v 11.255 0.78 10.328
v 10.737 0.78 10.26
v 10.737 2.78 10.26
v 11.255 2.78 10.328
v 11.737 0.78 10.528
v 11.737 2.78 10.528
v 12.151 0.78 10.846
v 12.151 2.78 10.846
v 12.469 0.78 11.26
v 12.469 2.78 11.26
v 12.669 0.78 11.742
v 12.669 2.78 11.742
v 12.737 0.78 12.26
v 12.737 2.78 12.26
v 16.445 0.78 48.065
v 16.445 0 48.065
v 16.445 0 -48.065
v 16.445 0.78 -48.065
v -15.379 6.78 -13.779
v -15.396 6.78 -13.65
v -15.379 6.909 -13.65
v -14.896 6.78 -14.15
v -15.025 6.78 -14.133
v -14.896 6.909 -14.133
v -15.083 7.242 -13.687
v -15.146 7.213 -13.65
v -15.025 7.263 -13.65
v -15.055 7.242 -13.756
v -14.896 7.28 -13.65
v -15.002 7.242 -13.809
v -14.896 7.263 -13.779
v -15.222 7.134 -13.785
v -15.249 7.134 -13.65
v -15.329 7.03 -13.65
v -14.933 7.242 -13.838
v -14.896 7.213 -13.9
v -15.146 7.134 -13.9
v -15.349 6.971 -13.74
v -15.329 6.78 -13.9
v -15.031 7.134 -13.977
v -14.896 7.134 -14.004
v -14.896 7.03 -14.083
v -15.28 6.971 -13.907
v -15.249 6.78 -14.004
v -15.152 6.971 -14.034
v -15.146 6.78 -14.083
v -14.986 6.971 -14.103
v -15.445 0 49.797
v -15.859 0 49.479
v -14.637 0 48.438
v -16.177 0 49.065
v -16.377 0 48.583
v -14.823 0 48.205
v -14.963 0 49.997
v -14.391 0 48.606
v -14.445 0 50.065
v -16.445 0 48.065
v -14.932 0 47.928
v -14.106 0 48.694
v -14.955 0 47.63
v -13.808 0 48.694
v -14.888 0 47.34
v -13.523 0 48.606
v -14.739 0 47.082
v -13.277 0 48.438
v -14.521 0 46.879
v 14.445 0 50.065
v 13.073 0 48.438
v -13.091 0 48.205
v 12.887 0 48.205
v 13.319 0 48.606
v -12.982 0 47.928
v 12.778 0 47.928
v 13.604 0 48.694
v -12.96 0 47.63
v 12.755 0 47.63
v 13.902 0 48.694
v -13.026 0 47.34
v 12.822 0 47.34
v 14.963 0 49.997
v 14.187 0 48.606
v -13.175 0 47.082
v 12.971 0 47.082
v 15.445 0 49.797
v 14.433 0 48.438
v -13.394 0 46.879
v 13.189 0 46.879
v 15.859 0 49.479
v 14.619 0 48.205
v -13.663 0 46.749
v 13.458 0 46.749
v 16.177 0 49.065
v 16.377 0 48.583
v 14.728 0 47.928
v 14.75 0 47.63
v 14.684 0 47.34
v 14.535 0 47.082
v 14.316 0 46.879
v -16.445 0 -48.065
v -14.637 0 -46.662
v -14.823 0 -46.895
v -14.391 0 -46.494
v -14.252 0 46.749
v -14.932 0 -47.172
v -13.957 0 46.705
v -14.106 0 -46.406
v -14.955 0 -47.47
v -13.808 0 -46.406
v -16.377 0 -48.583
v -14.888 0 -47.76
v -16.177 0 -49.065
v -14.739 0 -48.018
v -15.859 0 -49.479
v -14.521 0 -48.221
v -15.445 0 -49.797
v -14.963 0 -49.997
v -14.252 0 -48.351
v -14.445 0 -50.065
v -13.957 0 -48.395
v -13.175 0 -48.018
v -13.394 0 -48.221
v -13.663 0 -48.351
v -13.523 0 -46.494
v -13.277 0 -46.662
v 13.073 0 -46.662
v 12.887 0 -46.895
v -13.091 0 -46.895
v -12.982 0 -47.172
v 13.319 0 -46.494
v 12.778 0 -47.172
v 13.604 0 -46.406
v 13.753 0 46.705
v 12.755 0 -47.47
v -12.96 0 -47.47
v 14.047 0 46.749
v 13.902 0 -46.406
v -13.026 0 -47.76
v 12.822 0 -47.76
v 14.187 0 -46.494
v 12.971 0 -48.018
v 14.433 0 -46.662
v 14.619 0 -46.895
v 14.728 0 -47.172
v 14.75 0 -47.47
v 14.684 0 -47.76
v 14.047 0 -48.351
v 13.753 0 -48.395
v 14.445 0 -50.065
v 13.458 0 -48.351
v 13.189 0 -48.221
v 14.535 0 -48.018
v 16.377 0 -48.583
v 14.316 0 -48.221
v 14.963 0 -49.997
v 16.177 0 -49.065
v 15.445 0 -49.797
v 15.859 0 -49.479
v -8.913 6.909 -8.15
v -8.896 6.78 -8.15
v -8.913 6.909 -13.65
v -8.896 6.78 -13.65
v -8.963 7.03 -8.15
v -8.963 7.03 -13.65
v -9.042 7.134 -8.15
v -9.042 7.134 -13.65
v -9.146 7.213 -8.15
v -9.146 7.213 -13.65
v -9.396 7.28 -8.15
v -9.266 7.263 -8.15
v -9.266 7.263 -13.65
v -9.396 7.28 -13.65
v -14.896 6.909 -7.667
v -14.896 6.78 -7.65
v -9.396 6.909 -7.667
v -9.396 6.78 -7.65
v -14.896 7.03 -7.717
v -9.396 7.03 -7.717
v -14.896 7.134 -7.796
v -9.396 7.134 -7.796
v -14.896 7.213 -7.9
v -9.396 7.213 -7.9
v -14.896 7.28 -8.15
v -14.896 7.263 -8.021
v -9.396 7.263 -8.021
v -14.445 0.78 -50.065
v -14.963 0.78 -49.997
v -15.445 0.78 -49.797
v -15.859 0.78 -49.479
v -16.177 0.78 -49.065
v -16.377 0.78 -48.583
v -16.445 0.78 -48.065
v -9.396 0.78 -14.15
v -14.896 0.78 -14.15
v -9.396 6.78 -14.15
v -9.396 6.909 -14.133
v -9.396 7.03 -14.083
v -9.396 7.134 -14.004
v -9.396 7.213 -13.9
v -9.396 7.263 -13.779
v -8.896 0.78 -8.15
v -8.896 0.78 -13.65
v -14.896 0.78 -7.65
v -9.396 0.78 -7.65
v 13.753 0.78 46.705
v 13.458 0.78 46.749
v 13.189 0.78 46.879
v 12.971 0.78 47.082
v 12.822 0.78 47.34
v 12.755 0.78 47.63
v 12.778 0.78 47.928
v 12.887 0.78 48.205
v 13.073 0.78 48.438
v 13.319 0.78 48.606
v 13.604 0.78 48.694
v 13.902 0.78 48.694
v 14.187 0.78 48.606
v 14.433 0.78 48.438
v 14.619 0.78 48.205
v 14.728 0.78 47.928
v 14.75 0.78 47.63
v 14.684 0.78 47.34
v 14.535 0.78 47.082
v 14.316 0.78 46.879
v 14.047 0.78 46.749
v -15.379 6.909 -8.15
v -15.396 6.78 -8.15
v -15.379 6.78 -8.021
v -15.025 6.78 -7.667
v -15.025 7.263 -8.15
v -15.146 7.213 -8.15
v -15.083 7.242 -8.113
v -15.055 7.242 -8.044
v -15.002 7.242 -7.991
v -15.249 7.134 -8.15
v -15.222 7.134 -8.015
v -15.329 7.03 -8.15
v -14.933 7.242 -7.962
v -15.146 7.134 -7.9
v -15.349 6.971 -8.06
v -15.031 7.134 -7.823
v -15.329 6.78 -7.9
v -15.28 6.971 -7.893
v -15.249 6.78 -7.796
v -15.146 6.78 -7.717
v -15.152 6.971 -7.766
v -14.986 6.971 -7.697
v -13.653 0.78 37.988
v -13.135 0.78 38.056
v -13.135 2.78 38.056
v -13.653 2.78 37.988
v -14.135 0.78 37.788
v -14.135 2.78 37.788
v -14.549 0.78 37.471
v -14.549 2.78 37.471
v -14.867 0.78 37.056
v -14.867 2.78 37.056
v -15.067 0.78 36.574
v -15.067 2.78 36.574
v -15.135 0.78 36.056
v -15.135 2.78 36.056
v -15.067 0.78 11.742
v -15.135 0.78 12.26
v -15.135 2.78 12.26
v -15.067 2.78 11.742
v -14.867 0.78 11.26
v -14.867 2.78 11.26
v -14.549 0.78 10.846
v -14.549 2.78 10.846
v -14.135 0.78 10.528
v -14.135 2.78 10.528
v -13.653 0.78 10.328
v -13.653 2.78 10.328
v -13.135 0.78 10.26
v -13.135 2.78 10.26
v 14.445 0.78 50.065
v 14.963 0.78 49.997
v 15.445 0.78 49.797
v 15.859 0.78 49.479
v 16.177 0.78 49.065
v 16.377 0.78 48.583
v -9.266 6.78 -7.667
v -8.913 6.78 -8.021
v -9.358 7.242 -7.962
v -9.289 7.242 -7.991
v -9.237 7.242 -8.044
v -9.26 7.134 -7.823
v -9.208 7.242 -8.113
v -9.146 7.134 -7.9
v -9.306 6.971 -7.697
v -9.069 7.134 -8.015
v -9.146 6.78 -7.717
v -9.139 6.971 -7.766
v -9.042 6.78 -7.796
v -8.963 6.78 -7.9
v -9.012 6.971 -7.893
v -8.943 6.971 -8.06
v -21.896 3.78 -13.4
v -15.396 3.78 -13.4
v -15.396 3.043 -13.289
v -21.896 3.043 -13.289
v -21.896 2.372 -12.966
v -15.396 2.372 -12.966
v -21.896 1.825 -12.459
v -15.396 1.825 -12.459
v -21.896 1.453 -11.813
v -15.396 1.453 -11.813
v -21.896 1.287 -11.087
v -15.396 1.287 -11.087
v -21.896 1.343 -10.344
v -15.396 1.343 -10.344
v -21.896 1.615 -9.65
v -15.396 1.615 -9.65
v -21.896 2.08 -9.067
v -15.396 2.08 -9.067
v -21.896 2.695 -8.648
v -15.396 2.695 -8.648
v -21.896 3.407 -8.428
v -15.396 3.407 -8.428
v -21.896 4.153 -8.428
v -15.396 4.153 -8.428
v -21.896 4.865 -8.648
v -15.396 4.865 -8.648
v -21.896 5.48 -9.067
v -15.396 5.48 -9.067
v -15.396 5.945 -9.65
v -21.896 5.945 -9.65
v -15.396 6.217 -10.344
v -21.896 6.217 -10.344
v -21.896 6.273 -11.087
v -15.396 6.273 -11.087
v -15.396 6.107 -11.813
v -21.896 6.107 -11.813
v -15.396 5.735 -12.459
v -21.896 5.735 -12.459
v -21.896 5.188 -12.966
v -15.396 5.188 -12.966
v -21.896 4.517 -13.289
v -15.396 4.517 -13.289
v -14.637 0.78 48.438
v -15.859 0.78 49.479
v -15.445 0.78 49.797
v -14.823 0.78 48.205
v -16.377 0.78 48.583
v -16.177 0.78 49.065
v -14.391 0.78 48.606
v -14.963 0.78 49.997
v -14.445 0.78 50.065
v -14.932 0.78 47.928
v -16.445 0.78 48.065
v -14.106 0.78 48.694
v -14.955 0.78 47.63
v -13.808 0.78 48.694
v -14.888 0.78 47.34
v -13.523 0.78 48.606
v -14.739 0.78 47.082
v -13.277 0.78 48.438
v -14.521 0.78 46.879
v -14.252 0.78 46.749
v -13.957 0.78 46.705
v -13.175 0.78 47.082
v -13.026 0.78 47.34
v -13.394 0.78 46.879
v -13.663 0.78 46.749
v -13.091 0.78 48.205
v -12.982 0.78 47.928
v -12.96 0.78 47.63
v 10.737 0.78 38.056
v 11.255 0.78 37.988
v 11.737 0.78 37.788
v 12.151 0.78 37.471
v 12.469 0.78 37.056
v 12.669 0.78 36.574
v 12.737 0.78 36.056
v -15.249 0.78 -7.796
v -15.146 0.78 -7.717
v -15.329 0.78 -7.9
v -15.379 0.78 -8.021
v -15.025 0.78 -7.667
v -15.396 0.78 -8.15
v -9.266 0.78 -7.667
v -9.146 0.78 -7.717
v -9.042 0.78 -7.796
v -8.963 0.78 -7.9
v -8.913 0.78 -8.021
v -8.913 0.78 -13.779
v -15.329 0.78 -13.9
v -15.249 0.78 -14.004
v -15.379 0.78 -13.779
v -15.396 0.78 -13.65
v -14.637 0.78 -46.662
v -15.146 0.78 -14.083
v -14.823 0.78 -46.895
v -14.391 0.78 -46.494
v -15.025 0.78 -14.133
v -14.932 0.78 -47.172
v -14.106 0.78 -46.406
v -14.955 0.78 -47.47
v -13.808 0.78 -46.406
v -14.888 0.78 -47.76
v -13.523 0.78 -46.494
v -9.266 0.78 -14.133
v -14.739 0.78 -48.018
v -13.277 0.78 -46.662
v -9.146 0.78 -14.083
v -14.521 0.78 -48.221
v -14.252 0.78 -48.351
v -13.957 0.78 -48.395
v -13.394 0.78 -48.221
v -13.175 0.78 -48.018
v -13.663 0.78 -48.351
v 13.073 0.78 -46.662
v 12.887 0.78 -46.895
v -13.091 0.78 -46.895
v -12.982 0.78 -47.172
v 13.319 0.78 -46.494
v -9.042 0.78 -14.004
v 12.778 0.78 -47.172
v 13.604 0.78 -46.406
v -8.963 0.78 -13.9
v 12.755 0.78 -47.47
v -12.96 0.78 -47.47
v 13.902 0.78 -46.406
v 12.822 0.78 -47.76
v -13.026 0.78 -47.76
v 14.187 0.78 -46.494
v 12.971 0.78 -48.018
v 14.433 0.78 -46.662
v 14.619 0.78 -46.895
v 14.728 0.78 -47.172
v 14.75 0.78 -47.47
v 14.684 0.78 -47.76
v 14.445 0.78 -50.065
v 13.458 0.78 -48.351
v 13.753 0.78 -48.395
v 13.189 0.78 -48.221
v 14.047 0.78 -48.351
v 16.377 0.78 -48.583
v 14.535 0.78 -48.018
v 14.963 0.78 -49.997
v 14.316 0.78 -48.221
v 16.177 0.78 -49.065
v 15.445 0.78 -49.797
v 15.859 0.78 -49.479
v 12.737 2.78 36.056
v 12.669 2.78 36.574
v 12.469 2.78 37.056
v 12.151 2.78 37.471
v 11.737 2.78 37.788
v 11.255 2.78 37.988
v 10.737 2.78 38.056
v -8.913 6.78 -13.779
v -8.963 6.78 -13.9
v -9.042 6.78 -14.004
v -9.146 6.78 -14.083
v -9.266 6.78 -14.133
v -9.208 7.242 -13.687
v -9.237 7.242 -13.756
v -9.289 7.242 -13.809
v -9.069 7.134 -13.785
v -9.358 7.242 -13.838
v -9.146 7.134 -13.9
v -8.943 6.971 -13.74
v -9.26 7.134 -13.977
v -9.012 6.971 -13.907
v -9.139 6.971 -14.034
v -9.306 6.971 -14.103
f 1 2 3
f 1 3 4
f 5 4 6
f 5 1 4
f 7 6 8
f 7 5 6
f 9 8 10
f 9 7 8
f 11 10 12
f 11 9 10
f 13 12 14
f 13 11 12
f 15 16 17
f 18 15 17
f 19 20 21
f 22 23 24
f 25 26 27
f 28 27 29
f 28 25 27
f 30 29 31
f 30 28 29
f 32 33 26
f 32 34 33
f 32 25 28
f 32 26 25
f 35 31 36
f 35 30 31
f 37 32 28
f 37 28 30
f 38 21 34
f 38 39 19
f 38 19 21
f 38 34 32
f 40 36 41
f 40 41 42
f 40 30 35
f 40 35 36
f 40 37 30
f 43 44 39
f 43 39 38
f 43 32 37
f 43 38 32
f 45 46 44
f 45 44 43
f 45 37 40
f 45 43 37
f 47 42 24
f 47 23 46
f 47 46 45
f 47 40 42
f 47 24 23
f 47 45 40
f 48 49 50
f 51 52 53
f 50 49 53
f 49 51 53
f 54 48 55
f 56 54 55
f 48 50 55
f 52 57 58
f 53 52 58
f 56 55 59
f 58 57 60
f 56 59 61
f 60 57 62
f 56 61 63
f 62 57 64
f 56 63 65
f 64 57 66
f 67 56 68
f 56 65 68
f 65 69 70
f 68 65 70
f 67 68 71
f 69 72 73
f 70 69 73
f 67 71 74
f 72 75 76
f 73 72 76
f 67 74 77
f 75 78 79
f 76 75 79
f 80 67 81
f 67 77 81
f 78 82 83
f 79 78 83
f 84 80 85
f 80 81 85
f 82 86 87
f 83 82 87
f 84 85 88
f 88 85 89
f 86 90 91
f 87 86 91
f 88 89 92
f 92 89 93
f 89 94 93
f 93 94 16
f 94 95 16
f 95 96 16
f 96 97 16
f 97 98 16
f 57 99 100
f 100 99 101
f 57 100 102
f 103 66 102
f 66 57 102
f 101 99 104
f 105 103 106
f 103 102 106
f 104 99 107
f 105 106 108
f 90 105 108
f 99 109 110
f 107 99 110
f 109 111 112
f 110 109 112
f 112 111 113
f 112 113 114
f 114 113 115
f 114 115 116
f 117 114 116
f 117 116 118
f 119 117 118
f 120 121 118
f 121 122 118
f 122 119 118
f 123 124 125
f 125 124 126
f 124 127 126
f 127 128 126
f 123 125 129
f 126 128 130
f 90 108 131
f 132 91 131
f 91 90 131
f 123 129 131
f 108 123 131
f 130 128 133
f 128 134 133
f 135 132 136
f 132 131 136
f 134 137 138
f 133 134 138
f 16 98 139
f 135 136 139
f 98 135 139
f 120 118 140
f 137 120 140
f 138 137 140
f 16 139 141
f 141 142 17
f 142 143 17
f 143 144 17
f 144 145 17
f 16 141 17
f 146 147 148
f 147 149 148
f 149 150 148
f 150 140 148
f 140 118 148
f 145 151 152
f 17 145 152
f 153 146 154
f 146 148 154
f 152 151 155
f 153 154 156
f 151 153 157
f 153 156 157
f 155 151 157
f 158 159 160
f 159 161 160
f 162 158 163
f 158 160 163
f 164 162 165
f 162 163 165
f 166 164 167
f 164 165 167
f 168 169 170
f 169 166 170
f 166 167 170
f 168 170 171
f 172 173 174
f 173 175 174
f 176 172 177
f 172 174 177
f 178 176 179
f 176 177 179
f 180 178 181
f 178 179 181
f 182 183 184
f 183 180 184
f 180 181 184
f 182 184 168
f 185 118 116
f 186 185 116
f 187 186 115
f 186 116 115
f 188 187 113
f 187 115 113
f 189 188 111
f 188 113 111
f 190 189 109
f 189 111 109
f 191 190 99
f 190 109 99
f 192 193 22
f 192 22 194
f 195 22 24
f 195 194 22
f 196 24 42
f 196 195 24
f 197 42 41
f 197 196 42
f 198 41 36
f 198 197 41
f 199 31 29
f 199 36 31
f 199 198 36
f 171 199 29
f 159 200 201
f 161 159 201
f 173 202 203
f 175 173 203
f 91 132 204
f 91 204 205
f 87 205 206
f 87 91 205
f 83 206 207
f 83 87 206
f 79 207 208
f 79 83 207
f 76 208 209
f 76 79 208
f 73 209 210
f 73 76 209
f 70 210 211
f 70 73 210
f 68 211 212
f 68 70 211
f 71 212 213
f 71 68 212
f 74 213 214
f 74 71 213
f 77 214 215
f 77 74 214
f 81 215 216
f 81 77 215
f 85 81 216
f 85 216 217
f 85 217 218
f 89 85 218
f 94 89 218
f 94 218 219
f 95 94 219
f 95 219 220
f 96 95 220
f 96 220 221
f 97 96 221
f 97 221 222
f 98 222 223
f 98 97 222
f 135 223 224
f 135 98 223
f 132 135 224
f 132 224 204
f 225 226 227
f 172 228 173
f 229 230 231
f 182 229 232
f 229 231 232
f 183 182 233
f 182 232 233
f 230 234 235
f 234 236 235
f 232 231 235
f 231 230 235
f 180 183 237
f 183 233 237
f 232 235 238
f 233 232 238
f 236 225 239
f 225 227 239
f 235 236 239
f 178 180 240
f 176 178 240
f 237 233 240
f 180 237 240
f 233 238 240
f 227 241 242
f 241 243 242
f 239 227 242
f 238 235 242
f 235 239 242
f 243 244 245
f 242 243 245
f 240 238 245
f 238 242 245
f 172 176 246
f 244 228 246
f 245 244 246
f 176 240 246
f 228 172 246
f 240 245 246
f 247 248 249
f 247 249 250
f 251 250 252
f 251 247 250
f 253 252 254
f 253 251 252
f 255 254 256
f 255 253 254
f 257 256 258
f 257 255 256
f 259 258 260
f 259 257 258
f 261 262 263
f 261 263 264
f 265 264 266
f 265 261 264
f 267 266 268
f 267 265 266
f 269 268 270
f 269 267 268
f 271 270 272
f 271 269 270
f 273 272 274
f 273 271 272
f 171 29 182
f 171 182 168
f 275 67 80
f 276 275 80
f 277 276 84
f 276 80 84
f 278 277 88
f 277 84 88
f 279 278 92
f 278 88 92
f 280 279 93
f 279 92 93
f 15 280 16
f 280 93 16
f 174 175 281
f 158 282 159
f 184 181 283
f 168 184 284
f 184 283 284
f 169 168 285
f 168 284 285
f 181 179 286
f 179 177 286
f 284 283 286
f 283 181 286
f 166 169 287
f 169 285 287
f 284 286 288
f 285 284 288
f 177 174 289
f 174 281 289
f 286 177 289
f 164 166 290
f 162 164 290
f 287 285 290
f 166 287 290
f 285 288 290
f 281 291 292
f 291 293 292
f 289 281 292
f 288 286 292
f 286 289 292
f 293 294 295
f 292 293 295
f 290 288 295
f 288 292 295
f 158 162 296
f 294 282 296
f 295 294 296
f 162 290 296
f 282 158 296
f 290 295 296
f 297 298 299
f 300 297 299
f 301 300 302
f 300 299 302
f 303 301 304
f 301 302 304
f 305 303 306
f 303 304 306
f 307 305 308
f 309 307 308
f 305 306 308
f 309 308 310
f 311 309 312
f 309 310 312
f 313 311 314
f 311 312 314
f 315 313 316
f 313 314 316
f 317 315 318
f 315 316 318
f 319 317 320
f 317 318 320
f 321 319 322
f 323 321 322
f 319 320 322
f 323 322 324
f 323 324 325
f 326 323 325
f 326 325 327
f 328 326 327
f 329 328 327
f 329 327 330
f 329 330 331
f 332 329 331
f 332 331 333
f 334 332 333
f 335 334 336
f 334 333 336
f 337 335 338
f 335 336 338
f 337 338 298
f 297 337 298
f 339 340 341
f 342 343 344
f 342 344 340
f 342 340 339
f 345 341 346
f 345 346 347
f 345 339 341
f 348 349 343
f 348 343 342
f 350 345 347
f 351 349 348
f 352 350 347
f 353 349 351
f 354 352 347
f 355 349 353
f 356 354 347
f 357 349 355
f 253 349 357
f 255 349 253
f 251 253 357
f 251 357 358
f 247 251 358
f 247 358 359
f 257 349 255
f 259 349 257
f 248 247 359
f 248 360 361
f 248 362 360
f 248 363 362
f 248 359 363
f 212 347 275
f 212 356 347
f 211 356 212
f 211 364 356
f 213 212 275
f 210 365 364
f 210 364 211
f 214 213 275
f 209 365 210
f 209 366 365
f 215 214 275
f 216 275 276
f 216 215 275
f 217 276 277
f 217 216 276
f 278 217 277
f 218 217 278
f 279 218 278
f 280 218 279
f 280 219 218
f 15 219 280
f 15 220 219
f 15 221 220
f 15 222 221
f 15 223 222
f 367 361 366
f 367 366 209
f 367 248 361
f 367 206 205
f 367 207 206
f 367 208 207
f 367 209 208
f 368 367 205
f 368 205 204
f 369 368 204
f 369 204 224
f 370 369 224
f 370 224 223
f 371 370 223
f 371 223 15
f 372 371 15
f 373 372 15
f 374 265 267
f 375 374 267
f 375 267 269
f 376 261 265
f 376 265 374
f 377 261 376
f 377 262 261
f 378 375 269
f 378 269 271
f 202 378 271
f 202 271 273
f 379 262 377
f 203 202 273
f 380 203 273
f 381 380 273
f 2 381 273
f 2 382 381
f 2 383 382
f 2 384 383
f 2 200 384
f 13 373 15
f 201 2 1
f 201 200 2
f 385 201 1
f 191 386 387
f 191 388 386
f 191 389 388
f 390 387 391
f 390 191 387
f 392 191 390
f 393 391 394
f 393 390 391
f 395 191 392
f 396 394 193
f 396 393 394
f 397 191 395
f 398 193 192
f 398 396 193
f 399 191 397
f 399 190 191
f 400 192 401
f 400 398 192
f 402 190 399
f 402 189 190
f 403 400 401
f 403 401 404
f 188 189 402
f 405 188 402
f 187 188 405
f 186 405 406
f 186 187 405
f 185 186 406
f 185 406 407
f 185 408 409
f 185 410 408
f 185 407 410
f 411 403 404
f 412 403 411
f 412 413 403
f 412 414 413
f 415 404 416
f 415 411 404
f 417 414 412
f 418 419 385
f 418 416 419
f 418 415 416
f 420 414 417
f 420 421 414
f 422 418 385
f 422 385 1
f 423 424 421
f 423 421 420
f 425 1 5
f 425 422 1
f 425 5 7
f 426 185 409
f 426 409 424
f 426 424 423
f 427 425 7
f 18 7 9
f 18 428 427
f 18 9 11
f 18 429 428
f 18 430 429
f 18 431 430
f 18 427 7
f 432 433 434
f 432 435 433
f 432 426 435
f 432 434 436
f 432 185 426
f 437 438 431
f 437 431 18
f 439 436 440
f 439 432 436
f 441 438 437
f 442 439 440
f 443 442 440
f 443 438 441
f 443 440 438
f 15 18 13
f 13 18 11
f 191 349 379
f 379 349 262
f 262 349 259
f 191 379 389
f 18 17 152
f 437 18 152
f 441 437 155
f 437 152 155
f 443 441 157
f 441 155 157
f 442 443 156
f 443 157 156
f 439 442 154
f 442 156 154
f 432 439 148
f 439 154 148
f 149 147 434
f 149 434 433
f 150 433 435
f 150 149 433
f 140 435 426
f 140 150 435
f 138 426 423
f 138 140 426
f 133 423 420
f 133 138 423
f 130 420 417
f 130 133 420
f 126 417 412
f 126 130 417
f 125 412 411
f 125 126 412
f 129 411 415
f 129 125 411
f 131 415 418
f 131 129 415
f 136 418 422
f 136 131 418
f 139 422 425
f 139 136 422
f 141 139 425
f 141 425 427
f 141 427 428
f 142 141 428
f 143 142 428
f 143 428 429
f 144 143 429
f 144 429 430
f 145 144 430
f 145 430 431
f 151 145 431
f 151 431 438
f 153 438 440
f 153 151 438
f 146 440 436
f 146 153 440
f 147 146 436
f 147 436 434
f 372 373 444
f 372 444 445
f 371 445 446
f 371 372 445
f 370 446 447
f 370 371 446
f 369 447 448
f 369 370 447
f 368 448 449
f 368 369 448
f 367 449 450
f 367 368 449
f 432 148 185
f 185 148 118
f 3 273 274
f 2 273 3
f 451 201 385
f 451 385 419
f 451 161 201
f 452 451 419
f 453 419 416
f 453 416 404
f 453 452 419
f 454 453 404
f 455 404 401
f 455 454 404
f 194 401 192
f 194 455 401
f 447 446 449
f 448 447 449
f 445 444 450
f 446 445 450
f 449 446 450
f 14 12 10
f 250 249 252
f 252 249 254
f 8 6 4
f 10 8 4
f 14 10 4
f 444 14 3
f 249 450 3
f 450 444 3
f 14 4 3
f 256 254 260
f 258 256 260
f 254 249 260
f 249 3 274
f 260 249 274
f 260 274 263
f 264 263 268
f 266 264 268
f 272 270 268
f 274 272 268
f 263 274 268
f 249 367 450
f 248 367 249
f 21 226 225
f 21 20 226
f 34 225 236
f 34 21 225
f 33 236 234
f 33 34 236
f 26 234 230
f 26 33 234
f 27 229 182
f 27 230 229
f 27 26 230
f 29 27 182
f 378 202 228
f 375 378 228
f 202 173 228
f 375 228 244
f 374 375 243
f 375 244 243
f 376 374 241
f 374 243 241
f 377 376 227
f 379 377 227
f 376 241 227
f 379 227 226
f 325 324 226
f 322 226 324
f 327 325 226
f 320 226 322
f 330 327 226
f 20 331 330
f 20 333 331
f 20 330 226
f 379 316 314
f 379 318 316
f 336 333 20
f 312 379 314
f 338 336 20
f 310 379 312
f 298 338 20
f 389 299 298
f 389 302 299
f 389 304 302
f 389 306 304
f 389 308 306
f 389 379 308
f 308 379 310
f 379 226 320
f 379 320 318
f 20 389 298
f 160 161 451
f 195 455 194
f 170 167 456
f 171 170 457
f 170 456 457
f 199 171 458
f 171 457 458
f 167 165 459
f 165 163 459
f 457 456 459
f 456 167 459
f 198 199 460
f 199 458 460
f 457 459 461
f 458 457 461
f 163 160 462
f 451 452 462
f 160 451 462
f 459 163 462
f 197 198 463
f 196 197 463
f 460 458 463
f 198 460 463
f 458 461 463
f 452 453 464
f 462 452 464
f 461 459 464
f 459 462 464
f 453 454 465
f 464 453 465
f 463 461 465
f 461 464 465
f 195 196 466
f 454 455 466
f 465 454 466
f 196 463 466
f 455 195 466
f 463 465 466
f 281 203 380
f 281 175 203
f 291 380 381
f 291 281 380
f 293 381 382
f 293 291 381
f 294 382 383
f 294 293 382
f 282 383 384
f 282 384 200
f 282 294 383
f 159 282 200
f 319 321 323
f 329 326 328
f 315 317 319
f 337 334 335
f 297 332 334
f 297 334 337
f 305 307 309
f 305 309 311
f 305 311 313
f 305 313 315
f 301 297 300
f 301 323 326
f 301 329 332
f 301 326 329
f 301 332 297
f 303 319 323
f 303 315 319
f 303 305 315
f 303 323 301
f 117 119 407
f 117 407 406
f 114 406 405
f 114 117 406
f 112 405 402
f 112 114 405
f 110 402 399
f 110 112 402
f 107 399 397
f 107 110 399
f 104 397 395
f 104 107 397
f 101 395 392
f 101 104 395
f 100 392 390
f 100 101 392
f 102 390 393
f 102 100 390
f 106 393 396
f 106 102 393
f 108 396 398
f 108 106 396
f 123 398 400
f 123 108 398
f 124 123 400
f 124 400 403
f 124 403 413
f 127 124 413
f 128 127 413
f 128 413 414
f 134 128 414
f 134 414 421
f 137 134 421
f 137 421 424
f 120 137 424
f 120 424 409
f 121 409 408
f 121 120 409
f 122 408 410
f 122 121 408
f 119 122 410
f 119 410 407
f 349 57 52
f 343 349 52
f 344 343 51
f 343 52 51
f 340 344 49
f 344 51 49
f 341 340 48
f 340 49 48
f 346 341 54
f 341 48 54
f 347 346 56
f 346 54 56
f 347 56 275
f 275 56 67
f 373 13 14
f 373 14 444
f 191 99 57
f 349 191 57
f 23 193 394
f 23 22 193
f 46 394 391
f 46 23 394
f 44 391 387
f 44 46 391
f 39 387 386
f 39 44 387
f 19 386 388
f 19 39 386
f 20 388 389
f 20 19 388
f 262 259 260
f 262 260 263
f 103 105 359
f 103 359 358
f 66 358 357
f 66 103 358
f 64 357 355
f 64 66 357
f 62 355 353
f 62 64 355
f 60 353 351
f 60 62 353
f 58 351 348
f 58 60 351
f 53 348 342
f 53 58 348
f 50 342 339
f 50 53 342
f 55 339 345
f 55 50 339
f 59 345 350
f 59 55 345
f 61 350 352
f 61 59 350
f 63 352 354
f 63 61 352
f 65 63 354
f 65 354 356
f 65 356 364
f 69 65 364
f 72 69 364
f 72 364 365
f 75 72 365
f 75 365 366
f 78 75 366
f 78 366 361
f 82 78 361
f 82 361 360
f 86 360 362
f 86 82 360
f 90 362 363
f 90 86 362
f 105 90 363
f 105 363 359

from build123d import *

# Parameters (mm, degrees)
SKETCH1_R           = 1
BOSS_EXTRUDE1_DEPTH = 0.78
SKETCH2_W           = 6.5
SKETCH2_H           = 6.5
BOSS_EXTRUDE2_DEPTH = 6.5
FILLET1_R           = 0.5
SKETCH3_R           = 2.5
BOSS_EXTRUDE3_DEPTH = 6.5
BOSS_EXTRUDE4_DEPTH = 2


with BuildPart() as part:
    # Sketch1 → Boss-Extrude1 (new body)
    with BuildSketch(Plane(origin=(0, 0, 0), x_dir=(1, 0, 0), z_dir=(0, 1, 0))):
        with BuildLine():
            Line((-14.445, -50.065), (14.445, -50.065))
            ThreePointArc((14.445, -50.065), (15.859213562, -49.479213562), (16.445, -48.065))
            Line((16.445, -48.065), (16.445, 48.065))
            ThreePointArc((16.445, 48.065), (15.859213562, 49.479213562), (14.445, 50.065))
            Line((14.445, 50.065), (-14.445, 50.065))
            ThreePointArc((-14.445, 50.065), (-15.859213562, 49.479213562), (-16.445, 48.065))
            Line((-16.445, 48.065), (-16.445, -48.065))
            ThreePointArc((-16.445, -48.065), (-15.859213562, -49.479213562), (-14.445, -50.065))
        make_face()
        with Locations(Location((-13.957298137, 47.395, 0), (0, 0, 90))):
            Circle(SKETCH1_R, mode=Mode.SUBTRACT)
        with Locations(Location((13.752701863, 47.395, 0), (0, 0, 90))):
            Circle(SKETCH1_R, mode=Mode.SUBTRACT)
        with Locations(Location((13.752701863, -47.705, 0), (0, 0, 90))):
            Circle(SKETCH1_R, mode=Mode.SUBTRACT)
        with Locations(Location((-13.957298137, -47.705, 0), (0, 0, 90))):
            Circle(SKETCH1_R, mode=Mode.SUBTRACT)
    extrude(amount=BOSS_EXTRUDE1_DEPTH)

    # Sketch2 → Boss-Extrude2 (add)
    with BuildSketch(Plane(origin=(0, 0.78, 0), x_dir=(1, 0, 0), z_dir=(0, 1, 0))):
        with Locations((-12.145631844, 10.899949454)):
            Rectangle(SKETCH2_W, SKETCH2_H)
    extrude(amount=BOSS_EXTRUDE2_DEPTH)

    # Fillet1
    fillet1_edges = [part.edges().sort_by_distance(p)[0] for p in [
        (-15.395631844, 4.03, -14.149949454),
        (-15.395631844, 4.03, -7.649949454),
        (-8.895631844, 4.03, -7.649949454),
        (-8.895631844, 4.03, -14.149949454),
        (-15.395631844, 7.28, -10.899949454),
        (-12.145631844, 7.28, -7.649949454),
        (-8.895631844, 7.28, -10.899949454),
        (-12.145631844, 7.28, -14.149949454),
    ]]
    fillet(fillet1_edges, radius=FILLET1_R)

    # Sketch3 → Boss-Extrude3 (add)
    with BuildSketch(Plane.ZY.offset(15.395631844)):
        with Locations(Location((-10.899949454, 3.78, 0), (0, 0, 180))):
            Circle(SKETCH3_R)
    extrude(amount=BOSS_EXTRUDE3_DEPTH)

    # Sketch4 → Boss-Extrude4 (add)
    with BuildSketch(Plane(origin=(0, 0.78, 0), x_dir=(1, 0, 0), z_dir=(0, 1, 0))):
        with BuildLine():
            Line((-13.135206183, -10.259829813), (10.737242055, -10.259829813))
            ThreePointArc((10.737242055, -10.259829813), (12.151455617, -10.845616251), (12.737242055, -12.259829813))
            Line((12.737242055, -12.259829813), (12.737242055, -36.056331326))
            ThreePointArc((12.737242055, -36.056331326), (12.151455617, -37.470544888), (10.737242055, -38.056331326))
            Line((10.737242055, -38.056331326), (-13.135206183, -38.056331326))
            ThreePointArc((-13.135206183, -38.056331326), (-14.549419745, -37.470544888), (-15.135206183, -36.056331326))
            Line((-15.135206183, -36.056331326), (-15.135206183, -12.259829813))
            ThreePointArc((-15.135206183, -12.259829813), (-14.549419745, -10.845616251), (-13.135206183, -10.259829813))
        make_face()
    extrude(amount=BOSS_EXTRUDE4_DEPTH)


solid = part.part
